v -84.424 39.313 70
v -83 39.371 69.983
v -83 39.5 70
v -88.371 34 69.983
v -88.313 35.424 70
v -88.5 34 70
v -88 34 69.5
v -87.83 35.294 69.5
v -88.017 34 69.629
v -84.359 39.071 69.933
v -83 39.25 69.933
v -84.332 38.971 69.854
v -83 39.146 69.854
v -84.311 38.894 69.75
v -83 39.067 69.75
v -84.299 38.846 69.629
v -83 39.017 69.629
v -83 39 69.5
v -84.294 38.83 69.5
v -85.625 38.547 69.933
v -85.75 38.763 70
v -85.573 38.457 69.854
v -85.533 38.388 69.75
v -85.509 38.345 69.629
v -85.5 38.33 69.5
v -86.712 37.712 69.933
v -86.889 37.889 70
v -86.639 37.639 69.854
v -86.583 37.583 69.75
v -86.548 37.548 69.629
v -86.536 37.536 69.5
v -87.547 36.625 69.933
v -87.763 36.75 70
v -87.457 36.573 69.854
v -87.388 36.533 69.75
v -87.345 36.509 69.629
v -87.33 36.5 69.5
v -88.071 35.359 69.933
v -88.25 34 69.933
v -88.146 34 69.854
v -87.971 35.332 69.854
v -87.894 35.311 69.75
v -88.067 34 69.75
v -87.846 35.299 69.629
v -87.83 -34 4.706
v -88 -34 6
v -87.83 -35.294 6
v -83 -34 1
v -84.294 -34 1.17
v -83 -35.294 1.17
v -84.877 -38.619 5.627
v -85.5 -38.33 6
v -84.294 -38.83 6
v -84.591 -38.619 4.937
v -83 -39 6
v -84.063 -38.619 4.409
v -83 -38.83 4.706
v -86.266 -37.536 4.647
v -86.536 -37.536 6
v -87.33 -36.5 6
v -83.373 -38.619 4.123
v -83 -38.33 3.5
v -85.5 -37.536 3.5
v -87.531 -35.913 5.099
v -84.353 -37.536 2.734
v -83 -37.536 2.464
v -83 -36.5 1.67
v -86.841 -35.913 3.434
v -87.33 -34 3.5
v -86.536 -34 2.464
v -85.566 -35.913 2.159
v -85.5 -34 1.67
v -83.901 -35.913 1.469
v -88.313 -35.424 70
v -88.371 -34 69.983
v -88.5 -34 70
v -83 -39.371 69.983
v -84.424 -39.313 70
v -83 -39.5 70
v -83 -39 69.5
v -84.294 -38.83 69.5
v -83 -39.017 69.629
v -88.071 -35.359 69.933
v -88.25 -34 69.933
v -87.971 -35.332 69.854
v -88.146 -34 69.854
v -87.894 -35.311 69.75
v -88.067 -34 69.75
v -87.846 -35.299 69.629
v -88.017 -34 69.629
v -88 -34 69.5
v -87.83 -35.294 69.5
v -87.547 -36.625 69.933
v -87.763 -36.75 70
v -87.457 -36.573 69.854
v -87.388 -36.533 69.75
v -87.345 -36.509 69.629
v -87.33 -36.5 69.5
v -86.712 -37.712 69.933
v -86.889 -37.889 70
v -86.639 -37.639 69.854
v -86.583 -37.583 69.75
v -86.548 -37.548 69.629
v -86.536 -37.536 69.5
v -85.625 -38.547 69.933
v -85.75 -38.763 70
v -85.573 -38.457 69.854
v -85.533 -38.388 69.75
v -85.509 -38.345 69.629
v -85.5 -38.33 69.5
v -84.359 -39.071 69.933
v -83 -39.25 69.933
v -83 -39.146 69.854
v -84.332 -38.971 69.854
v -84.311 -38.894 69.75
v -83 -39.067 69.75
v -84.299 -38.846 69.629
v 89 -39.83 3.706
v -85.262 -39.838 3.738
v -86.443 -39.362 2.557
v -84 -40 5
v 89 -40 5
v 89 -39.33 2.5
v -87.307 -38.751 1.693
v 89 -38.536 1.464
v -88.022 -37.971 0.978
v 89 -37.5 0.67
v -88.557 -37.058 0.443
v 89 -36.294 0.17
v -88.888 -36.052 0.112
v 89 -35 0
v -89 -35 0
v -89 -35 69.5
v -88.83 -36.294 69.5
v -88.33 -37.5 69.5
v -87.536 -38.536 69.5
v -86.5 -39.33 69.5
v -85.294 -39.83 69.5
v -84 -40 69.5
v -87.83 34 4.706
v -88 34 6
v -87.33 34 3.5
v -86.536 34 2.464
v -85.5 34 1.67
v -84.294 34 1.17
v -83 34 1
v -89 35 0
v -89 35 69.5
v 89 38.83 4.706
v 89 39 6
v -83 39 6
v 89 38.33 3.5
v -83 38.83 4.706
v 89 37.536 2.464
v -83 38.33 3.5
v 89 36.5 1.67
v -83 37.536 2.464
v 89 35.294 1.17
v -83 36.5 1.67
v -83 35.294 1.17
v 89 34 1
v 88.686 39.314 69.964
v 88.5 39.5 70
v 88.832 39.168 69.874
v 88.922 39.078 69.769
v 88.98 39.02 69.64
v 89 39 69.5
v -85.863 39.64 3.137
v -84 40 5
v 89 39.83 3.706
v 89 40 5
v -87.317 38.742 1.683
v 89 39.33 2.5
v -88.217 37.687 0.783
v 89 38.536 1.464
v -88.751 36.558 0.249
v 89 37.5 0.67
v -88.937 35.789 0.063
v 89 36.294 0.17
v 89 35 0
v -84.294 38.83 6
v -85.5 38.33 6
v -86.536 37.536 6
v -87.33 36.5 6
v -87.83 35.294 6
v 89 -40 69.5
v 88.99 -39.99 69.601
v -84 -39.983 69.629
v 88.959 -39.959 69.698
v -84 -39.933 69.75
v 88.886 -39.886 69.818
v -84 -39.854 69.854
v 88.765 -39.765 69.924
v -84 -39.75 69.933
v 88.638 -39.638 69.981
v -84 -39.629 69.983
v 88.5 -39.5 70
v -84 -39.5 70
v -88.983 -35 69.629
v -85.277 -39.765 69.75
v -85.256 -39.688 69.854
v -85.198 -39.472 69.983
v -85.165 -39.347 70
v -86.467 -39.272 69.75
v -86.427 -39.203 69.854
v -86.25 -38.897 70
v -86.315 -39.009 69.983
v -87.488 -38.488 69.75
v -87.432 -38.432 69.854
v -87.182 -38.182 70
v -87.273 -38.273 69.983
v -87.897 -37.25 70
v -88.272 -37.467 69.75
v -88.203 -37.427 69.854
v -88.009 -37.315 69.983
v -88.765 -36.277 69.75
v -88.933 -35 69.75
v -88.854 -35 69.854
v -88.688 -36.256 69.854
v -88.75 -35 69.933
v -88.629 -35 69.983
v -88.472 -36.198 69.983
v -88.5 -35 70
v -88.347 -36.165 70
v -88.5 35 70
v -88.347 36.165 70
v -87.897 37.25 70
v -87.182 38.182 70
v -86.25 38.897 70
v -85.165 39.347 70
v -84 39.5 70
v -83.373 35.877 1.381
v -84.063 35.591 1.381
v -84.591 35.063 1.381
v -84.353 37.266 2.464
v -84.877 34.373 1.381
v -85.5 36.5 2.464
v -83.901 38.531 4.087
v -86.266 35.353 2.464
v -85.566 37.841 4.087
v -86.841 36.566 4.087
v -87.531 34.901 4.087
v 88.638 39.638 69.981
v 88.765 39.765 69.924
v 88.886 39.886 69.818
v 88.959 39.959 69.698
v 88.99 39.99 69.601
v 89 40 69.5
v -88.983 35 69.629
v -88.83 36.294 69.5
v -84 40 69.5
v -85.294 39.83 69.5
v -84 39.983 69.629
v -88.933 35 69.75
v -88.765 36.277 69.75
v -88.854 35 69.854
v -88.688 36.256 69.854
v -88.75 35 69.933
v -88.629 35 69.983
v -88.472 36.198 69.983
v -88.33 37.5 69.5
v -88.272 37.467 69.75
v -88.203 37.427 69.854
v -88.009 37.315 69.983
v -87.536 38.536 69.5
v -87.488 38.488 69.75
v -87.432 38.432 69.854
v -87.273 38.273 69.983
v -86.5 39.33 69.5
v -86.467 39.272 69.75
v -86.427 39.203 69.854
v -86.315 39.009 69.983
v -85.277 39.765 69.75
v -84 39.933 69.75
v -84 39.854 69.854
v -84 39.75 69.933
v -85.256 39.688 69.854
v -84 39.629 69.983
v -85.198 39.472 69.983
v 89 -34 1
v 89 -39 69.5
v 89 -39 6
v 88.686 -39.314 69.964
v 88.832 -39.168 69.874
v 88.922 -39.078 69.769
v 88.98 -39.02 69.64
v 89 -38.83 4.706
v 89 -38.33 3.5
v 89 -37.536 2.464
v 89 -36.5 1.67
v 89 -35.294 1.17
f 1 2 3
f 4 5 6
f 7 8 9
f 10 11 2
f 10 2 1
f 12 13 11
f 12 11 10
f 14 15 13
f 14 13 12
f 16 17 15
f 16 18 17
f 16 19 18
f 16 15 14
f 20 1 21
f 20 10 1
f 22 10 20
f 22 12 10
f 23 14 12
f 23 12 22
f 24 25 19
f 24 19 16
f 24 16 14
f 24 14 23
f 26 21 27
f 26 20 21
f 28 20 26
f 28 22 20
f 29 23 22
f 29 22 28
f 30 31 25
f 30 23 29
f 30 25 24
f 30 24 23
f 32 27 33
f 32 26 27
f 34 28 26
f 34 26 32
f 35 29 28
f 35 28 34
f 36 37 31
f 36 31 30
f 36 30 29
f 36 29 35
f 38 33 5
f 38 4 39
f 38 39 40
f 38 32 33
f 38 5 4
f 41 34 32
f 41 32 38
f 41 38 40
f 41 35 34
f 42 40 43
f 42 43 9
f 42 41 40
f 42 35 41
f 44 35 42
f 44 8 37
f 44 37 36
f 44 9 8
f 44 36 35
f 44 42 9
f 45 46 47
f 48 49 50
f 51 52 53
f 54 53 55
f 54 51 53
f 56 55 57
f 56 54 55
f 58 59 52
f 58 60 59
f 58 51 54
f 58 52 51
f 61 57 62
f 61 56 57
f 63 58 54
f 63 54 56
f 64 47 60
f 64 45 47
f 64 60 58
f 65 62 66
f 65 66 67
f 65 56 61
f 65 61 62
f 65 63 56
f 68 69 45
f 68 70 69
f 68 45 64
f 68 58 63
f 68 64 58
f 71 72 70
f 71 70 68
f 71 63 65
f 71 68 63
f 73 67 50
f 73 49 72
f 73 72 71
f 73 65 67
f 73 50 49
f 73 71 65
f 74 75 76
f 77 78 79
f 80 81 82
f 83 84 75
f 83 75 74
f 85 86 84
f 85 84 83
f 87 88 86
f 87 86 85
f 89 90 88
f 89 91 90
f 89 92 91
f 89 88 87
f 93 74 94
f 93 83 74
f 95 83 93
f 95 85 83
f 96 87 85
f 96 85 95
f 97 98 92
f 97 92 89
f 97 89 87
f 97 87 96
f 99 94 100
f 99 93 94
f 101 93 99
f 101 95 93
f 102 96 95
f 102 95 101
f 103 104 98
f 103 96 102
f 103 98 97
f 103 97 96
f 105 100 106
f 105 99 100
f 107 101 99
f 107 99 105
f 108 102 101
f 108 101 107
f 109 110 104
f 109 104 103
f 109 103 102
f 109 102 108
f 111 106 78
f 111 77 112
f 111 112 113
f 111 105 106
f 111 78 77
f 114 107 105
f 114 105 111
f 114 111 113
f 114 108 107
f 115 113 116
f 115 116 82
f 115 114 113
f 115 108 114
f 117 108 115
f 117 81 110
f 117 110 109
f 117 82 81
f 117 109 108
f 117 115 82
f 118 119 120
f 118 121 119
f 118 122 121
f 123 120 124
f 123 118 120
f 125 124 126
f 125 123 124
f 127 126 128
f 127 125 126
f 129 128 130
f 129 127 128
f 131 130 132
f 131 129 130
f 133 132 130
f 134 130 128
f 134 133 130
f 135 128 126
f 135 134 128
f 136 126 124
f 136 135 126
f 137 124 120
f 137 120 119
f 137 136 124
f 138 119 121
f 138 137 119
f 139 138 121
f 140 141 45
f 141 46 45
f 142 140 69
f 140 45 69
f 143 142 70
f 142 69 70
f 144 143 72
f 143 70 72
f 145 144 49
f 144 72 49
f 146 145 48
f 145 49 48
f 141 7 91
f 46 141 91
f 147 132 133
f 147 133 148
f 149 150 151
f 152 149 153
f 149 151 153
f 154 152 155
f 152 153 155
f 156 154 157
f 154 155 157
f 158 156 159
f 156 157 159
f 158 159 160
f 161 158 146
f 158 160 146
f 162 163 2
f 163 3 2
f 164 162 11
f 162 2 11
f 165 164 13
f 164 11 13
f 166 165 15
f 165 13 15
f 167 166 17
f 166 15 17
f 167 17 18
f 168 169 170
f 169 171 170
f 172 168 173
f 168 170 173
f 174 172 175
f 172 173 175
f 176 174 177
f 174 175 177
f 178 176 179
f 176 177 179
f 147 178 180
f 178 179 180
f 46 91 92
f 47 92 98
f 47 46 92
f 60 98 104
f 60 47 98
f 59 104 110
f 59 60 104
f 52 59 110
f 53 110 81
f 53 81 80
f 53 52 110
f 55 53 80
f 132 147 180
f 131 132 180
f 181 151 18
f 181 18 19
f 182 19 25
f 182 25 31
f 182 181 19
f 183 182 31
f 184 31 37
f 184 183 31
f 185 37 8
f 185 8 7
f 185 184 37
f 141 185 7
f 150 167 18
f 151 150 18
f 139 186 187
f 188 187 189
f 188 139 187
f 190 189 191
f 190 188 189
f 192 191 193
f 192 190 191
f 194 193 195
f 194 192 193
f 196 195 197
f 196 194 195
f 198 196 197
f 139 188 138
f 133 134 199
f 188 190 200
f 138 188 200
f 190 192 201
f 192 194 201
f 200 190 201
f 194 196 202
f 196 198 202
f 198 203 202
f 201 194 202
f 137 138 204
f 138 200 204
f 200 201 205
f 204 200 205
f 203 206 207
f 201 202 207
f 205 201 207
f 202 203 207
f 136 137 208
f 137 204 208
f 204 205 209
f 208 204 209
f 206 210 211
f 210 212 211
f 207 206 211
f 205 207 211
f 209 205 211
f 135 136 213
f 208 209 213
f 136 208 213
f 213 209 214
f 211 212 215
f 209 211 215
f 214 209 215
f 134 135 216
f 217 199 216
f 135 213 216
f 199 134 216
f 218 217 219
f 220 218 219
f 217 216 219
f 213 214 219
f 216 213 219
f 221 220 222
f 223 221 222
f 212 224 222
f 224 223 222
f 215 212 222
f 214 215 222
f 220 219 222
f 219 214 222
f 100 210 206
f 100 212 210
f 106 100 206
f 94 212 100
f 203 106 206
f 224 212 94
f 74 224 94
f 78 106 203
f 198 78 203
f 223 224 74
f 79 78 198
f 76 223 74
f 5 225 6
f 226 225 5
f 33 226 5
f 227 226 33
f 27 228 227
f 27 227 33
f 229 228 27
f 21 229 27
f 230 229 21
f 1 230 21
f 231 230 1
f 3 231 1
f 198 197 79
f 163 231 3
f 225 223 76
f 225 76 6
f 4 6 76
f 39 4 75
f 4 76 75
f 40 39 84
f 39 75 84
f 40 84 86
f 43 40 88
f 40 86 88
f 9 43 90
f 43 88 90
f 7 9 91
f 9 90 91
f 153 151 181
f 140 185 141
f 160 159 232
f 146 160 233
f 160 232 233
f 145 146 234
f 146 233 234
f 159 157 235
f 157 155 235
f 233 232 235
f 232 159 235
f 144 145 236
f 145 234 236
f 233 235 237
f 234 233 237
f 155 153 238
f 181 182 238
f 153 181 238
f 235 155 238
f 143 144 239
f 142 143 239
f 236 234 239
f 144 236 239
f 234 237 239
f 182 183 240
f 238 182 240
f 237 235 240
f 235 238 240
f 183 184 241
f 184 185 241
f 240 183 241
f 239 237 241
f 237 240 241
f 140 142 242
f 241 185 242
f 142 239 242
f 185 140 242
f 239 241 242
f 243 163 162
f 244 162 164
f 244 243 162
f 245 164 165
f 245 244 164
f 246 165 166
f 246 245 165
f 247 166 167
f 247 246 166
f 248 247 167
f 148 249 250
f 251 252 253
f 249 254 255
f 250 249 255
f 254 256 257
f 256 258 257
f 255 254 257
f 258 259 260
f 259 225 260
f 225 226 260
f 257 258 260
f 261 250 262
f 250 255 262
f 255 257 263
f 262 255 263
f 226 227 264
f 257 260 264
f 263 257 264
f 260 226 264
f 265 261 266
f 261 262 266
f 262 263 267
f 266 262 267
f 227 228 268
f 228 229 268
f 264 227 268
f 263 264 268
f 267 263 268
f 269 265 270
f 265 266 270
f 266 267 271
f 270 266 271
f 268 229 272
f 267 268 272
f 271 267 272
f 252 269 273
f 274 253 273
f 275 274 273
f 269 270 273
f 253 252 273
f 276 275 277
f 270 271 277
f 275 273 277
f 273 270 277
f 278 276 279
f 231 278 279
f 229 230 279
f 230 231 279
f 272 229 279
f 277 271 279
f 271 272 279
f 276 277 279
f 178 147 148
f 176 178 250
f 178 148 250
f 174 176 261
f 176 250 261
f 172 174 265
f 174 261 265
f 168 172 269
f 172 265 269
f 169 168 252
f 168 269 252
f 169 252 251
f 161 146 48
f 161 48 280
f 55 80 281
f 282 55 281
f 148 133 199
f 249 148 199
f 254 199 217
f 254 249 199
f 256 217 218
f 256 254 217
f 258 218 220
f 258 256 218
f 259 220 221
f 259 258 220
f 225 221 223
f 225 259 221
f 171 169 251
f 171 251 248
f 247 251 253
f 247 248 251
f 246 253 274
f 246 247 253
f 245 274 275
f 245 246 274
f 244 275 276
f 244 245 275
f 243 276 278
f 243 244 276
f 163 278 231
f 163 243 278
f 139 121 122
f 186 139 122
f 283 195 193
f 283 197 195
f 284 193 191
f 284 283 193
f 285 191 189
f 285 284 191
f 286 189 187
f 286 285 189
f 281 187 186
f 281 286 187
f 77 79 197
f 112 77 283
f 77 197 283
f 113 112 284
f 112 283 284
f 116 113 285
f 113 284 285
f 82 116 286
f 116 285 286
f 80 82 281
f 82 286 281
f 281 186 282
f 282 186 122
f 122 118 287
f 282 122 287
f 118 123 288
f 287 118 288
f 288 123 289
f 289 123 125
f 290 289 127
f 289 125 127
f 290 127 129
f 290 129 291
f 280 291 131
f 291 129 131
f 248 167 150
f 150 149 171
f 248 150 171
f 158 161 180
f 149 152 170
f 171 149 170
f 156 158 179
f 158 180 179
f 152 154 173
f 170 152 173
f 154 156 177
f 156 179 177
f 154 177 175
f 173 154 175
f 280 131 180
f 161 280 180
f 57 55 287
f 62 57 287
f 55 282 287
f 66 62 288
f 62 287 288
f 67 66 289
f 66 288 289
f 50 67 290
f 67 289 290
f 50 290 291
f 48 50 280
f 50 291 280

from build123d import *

# Parameters (mm, degrees)
F0_W     = 178
F0_H     = 80
F1_DEPTH = 70
F3_DEPTH = 69
F4_R     = 5
F5_R     = 0.49999


# Not quite as in the source:
# - a fillet or chamfer is up to 0.001 mm smaller than in the source, because OpenCascade refuses the exact size


with BuildPart() as f1:
    # F0 (on Top) → F1 (new body)
    with BuildSketch(Plane.XY):
        Rectangle(F0_W, F0_H)
    extrude(amount=F1_DEPTH)

    # F2 (on face) → F3 (cut)
    with BuildSketch(Plane.XY.offset(70)):
        Polygon((-88, -24.0239519626), (-88, -39), (-83.0030292273, -39), (89, -39), (89, 39), (-88, 39), align=None)
    extrude(amount=-F3_DEPTH, mode=Mode.SUBTRACT)

    # F4
    f4_edges = [f1.edges().sort_by_distance(p)[0] for p in [
        (-88, 39, 35.5),
        (0.5, 39, 1),
        (-88, 0, 1),
        (-88, -39, 35.5),
        (0.5, -39, 1),
        (0, 40, 0),
        (-89, 40, 35),
        (-89, -40, 35),
        (0, -40, 0),
    ]]
    fillet(f4_edges, radius=F4_R)

    # F5 (radius 0.5 in the source; OpenCascade refuses exactly that, so slightly less here)
    f5_edges = [f1.edges().sort_by_distance(p)[0] for p in [
        (-89, 0, 70),
        (-87.535534, 38.535534, 70),
        (-87.535534, -38.535534, 70),
        (2.5, 40, 70),
        (2.5, -40, 70),
        (89, 39.5, 70),
        (89, -39.5, 70),
        (3, 39, 70),
        (3, -39, 70),
        (-86.535534, 37.535534, 70),
        (-86.535534, -37.535534, 70),
        (-88, 0, 70),
    ]]
    fillet(f5_edges, radius=F5_R)


solid = f1.part
